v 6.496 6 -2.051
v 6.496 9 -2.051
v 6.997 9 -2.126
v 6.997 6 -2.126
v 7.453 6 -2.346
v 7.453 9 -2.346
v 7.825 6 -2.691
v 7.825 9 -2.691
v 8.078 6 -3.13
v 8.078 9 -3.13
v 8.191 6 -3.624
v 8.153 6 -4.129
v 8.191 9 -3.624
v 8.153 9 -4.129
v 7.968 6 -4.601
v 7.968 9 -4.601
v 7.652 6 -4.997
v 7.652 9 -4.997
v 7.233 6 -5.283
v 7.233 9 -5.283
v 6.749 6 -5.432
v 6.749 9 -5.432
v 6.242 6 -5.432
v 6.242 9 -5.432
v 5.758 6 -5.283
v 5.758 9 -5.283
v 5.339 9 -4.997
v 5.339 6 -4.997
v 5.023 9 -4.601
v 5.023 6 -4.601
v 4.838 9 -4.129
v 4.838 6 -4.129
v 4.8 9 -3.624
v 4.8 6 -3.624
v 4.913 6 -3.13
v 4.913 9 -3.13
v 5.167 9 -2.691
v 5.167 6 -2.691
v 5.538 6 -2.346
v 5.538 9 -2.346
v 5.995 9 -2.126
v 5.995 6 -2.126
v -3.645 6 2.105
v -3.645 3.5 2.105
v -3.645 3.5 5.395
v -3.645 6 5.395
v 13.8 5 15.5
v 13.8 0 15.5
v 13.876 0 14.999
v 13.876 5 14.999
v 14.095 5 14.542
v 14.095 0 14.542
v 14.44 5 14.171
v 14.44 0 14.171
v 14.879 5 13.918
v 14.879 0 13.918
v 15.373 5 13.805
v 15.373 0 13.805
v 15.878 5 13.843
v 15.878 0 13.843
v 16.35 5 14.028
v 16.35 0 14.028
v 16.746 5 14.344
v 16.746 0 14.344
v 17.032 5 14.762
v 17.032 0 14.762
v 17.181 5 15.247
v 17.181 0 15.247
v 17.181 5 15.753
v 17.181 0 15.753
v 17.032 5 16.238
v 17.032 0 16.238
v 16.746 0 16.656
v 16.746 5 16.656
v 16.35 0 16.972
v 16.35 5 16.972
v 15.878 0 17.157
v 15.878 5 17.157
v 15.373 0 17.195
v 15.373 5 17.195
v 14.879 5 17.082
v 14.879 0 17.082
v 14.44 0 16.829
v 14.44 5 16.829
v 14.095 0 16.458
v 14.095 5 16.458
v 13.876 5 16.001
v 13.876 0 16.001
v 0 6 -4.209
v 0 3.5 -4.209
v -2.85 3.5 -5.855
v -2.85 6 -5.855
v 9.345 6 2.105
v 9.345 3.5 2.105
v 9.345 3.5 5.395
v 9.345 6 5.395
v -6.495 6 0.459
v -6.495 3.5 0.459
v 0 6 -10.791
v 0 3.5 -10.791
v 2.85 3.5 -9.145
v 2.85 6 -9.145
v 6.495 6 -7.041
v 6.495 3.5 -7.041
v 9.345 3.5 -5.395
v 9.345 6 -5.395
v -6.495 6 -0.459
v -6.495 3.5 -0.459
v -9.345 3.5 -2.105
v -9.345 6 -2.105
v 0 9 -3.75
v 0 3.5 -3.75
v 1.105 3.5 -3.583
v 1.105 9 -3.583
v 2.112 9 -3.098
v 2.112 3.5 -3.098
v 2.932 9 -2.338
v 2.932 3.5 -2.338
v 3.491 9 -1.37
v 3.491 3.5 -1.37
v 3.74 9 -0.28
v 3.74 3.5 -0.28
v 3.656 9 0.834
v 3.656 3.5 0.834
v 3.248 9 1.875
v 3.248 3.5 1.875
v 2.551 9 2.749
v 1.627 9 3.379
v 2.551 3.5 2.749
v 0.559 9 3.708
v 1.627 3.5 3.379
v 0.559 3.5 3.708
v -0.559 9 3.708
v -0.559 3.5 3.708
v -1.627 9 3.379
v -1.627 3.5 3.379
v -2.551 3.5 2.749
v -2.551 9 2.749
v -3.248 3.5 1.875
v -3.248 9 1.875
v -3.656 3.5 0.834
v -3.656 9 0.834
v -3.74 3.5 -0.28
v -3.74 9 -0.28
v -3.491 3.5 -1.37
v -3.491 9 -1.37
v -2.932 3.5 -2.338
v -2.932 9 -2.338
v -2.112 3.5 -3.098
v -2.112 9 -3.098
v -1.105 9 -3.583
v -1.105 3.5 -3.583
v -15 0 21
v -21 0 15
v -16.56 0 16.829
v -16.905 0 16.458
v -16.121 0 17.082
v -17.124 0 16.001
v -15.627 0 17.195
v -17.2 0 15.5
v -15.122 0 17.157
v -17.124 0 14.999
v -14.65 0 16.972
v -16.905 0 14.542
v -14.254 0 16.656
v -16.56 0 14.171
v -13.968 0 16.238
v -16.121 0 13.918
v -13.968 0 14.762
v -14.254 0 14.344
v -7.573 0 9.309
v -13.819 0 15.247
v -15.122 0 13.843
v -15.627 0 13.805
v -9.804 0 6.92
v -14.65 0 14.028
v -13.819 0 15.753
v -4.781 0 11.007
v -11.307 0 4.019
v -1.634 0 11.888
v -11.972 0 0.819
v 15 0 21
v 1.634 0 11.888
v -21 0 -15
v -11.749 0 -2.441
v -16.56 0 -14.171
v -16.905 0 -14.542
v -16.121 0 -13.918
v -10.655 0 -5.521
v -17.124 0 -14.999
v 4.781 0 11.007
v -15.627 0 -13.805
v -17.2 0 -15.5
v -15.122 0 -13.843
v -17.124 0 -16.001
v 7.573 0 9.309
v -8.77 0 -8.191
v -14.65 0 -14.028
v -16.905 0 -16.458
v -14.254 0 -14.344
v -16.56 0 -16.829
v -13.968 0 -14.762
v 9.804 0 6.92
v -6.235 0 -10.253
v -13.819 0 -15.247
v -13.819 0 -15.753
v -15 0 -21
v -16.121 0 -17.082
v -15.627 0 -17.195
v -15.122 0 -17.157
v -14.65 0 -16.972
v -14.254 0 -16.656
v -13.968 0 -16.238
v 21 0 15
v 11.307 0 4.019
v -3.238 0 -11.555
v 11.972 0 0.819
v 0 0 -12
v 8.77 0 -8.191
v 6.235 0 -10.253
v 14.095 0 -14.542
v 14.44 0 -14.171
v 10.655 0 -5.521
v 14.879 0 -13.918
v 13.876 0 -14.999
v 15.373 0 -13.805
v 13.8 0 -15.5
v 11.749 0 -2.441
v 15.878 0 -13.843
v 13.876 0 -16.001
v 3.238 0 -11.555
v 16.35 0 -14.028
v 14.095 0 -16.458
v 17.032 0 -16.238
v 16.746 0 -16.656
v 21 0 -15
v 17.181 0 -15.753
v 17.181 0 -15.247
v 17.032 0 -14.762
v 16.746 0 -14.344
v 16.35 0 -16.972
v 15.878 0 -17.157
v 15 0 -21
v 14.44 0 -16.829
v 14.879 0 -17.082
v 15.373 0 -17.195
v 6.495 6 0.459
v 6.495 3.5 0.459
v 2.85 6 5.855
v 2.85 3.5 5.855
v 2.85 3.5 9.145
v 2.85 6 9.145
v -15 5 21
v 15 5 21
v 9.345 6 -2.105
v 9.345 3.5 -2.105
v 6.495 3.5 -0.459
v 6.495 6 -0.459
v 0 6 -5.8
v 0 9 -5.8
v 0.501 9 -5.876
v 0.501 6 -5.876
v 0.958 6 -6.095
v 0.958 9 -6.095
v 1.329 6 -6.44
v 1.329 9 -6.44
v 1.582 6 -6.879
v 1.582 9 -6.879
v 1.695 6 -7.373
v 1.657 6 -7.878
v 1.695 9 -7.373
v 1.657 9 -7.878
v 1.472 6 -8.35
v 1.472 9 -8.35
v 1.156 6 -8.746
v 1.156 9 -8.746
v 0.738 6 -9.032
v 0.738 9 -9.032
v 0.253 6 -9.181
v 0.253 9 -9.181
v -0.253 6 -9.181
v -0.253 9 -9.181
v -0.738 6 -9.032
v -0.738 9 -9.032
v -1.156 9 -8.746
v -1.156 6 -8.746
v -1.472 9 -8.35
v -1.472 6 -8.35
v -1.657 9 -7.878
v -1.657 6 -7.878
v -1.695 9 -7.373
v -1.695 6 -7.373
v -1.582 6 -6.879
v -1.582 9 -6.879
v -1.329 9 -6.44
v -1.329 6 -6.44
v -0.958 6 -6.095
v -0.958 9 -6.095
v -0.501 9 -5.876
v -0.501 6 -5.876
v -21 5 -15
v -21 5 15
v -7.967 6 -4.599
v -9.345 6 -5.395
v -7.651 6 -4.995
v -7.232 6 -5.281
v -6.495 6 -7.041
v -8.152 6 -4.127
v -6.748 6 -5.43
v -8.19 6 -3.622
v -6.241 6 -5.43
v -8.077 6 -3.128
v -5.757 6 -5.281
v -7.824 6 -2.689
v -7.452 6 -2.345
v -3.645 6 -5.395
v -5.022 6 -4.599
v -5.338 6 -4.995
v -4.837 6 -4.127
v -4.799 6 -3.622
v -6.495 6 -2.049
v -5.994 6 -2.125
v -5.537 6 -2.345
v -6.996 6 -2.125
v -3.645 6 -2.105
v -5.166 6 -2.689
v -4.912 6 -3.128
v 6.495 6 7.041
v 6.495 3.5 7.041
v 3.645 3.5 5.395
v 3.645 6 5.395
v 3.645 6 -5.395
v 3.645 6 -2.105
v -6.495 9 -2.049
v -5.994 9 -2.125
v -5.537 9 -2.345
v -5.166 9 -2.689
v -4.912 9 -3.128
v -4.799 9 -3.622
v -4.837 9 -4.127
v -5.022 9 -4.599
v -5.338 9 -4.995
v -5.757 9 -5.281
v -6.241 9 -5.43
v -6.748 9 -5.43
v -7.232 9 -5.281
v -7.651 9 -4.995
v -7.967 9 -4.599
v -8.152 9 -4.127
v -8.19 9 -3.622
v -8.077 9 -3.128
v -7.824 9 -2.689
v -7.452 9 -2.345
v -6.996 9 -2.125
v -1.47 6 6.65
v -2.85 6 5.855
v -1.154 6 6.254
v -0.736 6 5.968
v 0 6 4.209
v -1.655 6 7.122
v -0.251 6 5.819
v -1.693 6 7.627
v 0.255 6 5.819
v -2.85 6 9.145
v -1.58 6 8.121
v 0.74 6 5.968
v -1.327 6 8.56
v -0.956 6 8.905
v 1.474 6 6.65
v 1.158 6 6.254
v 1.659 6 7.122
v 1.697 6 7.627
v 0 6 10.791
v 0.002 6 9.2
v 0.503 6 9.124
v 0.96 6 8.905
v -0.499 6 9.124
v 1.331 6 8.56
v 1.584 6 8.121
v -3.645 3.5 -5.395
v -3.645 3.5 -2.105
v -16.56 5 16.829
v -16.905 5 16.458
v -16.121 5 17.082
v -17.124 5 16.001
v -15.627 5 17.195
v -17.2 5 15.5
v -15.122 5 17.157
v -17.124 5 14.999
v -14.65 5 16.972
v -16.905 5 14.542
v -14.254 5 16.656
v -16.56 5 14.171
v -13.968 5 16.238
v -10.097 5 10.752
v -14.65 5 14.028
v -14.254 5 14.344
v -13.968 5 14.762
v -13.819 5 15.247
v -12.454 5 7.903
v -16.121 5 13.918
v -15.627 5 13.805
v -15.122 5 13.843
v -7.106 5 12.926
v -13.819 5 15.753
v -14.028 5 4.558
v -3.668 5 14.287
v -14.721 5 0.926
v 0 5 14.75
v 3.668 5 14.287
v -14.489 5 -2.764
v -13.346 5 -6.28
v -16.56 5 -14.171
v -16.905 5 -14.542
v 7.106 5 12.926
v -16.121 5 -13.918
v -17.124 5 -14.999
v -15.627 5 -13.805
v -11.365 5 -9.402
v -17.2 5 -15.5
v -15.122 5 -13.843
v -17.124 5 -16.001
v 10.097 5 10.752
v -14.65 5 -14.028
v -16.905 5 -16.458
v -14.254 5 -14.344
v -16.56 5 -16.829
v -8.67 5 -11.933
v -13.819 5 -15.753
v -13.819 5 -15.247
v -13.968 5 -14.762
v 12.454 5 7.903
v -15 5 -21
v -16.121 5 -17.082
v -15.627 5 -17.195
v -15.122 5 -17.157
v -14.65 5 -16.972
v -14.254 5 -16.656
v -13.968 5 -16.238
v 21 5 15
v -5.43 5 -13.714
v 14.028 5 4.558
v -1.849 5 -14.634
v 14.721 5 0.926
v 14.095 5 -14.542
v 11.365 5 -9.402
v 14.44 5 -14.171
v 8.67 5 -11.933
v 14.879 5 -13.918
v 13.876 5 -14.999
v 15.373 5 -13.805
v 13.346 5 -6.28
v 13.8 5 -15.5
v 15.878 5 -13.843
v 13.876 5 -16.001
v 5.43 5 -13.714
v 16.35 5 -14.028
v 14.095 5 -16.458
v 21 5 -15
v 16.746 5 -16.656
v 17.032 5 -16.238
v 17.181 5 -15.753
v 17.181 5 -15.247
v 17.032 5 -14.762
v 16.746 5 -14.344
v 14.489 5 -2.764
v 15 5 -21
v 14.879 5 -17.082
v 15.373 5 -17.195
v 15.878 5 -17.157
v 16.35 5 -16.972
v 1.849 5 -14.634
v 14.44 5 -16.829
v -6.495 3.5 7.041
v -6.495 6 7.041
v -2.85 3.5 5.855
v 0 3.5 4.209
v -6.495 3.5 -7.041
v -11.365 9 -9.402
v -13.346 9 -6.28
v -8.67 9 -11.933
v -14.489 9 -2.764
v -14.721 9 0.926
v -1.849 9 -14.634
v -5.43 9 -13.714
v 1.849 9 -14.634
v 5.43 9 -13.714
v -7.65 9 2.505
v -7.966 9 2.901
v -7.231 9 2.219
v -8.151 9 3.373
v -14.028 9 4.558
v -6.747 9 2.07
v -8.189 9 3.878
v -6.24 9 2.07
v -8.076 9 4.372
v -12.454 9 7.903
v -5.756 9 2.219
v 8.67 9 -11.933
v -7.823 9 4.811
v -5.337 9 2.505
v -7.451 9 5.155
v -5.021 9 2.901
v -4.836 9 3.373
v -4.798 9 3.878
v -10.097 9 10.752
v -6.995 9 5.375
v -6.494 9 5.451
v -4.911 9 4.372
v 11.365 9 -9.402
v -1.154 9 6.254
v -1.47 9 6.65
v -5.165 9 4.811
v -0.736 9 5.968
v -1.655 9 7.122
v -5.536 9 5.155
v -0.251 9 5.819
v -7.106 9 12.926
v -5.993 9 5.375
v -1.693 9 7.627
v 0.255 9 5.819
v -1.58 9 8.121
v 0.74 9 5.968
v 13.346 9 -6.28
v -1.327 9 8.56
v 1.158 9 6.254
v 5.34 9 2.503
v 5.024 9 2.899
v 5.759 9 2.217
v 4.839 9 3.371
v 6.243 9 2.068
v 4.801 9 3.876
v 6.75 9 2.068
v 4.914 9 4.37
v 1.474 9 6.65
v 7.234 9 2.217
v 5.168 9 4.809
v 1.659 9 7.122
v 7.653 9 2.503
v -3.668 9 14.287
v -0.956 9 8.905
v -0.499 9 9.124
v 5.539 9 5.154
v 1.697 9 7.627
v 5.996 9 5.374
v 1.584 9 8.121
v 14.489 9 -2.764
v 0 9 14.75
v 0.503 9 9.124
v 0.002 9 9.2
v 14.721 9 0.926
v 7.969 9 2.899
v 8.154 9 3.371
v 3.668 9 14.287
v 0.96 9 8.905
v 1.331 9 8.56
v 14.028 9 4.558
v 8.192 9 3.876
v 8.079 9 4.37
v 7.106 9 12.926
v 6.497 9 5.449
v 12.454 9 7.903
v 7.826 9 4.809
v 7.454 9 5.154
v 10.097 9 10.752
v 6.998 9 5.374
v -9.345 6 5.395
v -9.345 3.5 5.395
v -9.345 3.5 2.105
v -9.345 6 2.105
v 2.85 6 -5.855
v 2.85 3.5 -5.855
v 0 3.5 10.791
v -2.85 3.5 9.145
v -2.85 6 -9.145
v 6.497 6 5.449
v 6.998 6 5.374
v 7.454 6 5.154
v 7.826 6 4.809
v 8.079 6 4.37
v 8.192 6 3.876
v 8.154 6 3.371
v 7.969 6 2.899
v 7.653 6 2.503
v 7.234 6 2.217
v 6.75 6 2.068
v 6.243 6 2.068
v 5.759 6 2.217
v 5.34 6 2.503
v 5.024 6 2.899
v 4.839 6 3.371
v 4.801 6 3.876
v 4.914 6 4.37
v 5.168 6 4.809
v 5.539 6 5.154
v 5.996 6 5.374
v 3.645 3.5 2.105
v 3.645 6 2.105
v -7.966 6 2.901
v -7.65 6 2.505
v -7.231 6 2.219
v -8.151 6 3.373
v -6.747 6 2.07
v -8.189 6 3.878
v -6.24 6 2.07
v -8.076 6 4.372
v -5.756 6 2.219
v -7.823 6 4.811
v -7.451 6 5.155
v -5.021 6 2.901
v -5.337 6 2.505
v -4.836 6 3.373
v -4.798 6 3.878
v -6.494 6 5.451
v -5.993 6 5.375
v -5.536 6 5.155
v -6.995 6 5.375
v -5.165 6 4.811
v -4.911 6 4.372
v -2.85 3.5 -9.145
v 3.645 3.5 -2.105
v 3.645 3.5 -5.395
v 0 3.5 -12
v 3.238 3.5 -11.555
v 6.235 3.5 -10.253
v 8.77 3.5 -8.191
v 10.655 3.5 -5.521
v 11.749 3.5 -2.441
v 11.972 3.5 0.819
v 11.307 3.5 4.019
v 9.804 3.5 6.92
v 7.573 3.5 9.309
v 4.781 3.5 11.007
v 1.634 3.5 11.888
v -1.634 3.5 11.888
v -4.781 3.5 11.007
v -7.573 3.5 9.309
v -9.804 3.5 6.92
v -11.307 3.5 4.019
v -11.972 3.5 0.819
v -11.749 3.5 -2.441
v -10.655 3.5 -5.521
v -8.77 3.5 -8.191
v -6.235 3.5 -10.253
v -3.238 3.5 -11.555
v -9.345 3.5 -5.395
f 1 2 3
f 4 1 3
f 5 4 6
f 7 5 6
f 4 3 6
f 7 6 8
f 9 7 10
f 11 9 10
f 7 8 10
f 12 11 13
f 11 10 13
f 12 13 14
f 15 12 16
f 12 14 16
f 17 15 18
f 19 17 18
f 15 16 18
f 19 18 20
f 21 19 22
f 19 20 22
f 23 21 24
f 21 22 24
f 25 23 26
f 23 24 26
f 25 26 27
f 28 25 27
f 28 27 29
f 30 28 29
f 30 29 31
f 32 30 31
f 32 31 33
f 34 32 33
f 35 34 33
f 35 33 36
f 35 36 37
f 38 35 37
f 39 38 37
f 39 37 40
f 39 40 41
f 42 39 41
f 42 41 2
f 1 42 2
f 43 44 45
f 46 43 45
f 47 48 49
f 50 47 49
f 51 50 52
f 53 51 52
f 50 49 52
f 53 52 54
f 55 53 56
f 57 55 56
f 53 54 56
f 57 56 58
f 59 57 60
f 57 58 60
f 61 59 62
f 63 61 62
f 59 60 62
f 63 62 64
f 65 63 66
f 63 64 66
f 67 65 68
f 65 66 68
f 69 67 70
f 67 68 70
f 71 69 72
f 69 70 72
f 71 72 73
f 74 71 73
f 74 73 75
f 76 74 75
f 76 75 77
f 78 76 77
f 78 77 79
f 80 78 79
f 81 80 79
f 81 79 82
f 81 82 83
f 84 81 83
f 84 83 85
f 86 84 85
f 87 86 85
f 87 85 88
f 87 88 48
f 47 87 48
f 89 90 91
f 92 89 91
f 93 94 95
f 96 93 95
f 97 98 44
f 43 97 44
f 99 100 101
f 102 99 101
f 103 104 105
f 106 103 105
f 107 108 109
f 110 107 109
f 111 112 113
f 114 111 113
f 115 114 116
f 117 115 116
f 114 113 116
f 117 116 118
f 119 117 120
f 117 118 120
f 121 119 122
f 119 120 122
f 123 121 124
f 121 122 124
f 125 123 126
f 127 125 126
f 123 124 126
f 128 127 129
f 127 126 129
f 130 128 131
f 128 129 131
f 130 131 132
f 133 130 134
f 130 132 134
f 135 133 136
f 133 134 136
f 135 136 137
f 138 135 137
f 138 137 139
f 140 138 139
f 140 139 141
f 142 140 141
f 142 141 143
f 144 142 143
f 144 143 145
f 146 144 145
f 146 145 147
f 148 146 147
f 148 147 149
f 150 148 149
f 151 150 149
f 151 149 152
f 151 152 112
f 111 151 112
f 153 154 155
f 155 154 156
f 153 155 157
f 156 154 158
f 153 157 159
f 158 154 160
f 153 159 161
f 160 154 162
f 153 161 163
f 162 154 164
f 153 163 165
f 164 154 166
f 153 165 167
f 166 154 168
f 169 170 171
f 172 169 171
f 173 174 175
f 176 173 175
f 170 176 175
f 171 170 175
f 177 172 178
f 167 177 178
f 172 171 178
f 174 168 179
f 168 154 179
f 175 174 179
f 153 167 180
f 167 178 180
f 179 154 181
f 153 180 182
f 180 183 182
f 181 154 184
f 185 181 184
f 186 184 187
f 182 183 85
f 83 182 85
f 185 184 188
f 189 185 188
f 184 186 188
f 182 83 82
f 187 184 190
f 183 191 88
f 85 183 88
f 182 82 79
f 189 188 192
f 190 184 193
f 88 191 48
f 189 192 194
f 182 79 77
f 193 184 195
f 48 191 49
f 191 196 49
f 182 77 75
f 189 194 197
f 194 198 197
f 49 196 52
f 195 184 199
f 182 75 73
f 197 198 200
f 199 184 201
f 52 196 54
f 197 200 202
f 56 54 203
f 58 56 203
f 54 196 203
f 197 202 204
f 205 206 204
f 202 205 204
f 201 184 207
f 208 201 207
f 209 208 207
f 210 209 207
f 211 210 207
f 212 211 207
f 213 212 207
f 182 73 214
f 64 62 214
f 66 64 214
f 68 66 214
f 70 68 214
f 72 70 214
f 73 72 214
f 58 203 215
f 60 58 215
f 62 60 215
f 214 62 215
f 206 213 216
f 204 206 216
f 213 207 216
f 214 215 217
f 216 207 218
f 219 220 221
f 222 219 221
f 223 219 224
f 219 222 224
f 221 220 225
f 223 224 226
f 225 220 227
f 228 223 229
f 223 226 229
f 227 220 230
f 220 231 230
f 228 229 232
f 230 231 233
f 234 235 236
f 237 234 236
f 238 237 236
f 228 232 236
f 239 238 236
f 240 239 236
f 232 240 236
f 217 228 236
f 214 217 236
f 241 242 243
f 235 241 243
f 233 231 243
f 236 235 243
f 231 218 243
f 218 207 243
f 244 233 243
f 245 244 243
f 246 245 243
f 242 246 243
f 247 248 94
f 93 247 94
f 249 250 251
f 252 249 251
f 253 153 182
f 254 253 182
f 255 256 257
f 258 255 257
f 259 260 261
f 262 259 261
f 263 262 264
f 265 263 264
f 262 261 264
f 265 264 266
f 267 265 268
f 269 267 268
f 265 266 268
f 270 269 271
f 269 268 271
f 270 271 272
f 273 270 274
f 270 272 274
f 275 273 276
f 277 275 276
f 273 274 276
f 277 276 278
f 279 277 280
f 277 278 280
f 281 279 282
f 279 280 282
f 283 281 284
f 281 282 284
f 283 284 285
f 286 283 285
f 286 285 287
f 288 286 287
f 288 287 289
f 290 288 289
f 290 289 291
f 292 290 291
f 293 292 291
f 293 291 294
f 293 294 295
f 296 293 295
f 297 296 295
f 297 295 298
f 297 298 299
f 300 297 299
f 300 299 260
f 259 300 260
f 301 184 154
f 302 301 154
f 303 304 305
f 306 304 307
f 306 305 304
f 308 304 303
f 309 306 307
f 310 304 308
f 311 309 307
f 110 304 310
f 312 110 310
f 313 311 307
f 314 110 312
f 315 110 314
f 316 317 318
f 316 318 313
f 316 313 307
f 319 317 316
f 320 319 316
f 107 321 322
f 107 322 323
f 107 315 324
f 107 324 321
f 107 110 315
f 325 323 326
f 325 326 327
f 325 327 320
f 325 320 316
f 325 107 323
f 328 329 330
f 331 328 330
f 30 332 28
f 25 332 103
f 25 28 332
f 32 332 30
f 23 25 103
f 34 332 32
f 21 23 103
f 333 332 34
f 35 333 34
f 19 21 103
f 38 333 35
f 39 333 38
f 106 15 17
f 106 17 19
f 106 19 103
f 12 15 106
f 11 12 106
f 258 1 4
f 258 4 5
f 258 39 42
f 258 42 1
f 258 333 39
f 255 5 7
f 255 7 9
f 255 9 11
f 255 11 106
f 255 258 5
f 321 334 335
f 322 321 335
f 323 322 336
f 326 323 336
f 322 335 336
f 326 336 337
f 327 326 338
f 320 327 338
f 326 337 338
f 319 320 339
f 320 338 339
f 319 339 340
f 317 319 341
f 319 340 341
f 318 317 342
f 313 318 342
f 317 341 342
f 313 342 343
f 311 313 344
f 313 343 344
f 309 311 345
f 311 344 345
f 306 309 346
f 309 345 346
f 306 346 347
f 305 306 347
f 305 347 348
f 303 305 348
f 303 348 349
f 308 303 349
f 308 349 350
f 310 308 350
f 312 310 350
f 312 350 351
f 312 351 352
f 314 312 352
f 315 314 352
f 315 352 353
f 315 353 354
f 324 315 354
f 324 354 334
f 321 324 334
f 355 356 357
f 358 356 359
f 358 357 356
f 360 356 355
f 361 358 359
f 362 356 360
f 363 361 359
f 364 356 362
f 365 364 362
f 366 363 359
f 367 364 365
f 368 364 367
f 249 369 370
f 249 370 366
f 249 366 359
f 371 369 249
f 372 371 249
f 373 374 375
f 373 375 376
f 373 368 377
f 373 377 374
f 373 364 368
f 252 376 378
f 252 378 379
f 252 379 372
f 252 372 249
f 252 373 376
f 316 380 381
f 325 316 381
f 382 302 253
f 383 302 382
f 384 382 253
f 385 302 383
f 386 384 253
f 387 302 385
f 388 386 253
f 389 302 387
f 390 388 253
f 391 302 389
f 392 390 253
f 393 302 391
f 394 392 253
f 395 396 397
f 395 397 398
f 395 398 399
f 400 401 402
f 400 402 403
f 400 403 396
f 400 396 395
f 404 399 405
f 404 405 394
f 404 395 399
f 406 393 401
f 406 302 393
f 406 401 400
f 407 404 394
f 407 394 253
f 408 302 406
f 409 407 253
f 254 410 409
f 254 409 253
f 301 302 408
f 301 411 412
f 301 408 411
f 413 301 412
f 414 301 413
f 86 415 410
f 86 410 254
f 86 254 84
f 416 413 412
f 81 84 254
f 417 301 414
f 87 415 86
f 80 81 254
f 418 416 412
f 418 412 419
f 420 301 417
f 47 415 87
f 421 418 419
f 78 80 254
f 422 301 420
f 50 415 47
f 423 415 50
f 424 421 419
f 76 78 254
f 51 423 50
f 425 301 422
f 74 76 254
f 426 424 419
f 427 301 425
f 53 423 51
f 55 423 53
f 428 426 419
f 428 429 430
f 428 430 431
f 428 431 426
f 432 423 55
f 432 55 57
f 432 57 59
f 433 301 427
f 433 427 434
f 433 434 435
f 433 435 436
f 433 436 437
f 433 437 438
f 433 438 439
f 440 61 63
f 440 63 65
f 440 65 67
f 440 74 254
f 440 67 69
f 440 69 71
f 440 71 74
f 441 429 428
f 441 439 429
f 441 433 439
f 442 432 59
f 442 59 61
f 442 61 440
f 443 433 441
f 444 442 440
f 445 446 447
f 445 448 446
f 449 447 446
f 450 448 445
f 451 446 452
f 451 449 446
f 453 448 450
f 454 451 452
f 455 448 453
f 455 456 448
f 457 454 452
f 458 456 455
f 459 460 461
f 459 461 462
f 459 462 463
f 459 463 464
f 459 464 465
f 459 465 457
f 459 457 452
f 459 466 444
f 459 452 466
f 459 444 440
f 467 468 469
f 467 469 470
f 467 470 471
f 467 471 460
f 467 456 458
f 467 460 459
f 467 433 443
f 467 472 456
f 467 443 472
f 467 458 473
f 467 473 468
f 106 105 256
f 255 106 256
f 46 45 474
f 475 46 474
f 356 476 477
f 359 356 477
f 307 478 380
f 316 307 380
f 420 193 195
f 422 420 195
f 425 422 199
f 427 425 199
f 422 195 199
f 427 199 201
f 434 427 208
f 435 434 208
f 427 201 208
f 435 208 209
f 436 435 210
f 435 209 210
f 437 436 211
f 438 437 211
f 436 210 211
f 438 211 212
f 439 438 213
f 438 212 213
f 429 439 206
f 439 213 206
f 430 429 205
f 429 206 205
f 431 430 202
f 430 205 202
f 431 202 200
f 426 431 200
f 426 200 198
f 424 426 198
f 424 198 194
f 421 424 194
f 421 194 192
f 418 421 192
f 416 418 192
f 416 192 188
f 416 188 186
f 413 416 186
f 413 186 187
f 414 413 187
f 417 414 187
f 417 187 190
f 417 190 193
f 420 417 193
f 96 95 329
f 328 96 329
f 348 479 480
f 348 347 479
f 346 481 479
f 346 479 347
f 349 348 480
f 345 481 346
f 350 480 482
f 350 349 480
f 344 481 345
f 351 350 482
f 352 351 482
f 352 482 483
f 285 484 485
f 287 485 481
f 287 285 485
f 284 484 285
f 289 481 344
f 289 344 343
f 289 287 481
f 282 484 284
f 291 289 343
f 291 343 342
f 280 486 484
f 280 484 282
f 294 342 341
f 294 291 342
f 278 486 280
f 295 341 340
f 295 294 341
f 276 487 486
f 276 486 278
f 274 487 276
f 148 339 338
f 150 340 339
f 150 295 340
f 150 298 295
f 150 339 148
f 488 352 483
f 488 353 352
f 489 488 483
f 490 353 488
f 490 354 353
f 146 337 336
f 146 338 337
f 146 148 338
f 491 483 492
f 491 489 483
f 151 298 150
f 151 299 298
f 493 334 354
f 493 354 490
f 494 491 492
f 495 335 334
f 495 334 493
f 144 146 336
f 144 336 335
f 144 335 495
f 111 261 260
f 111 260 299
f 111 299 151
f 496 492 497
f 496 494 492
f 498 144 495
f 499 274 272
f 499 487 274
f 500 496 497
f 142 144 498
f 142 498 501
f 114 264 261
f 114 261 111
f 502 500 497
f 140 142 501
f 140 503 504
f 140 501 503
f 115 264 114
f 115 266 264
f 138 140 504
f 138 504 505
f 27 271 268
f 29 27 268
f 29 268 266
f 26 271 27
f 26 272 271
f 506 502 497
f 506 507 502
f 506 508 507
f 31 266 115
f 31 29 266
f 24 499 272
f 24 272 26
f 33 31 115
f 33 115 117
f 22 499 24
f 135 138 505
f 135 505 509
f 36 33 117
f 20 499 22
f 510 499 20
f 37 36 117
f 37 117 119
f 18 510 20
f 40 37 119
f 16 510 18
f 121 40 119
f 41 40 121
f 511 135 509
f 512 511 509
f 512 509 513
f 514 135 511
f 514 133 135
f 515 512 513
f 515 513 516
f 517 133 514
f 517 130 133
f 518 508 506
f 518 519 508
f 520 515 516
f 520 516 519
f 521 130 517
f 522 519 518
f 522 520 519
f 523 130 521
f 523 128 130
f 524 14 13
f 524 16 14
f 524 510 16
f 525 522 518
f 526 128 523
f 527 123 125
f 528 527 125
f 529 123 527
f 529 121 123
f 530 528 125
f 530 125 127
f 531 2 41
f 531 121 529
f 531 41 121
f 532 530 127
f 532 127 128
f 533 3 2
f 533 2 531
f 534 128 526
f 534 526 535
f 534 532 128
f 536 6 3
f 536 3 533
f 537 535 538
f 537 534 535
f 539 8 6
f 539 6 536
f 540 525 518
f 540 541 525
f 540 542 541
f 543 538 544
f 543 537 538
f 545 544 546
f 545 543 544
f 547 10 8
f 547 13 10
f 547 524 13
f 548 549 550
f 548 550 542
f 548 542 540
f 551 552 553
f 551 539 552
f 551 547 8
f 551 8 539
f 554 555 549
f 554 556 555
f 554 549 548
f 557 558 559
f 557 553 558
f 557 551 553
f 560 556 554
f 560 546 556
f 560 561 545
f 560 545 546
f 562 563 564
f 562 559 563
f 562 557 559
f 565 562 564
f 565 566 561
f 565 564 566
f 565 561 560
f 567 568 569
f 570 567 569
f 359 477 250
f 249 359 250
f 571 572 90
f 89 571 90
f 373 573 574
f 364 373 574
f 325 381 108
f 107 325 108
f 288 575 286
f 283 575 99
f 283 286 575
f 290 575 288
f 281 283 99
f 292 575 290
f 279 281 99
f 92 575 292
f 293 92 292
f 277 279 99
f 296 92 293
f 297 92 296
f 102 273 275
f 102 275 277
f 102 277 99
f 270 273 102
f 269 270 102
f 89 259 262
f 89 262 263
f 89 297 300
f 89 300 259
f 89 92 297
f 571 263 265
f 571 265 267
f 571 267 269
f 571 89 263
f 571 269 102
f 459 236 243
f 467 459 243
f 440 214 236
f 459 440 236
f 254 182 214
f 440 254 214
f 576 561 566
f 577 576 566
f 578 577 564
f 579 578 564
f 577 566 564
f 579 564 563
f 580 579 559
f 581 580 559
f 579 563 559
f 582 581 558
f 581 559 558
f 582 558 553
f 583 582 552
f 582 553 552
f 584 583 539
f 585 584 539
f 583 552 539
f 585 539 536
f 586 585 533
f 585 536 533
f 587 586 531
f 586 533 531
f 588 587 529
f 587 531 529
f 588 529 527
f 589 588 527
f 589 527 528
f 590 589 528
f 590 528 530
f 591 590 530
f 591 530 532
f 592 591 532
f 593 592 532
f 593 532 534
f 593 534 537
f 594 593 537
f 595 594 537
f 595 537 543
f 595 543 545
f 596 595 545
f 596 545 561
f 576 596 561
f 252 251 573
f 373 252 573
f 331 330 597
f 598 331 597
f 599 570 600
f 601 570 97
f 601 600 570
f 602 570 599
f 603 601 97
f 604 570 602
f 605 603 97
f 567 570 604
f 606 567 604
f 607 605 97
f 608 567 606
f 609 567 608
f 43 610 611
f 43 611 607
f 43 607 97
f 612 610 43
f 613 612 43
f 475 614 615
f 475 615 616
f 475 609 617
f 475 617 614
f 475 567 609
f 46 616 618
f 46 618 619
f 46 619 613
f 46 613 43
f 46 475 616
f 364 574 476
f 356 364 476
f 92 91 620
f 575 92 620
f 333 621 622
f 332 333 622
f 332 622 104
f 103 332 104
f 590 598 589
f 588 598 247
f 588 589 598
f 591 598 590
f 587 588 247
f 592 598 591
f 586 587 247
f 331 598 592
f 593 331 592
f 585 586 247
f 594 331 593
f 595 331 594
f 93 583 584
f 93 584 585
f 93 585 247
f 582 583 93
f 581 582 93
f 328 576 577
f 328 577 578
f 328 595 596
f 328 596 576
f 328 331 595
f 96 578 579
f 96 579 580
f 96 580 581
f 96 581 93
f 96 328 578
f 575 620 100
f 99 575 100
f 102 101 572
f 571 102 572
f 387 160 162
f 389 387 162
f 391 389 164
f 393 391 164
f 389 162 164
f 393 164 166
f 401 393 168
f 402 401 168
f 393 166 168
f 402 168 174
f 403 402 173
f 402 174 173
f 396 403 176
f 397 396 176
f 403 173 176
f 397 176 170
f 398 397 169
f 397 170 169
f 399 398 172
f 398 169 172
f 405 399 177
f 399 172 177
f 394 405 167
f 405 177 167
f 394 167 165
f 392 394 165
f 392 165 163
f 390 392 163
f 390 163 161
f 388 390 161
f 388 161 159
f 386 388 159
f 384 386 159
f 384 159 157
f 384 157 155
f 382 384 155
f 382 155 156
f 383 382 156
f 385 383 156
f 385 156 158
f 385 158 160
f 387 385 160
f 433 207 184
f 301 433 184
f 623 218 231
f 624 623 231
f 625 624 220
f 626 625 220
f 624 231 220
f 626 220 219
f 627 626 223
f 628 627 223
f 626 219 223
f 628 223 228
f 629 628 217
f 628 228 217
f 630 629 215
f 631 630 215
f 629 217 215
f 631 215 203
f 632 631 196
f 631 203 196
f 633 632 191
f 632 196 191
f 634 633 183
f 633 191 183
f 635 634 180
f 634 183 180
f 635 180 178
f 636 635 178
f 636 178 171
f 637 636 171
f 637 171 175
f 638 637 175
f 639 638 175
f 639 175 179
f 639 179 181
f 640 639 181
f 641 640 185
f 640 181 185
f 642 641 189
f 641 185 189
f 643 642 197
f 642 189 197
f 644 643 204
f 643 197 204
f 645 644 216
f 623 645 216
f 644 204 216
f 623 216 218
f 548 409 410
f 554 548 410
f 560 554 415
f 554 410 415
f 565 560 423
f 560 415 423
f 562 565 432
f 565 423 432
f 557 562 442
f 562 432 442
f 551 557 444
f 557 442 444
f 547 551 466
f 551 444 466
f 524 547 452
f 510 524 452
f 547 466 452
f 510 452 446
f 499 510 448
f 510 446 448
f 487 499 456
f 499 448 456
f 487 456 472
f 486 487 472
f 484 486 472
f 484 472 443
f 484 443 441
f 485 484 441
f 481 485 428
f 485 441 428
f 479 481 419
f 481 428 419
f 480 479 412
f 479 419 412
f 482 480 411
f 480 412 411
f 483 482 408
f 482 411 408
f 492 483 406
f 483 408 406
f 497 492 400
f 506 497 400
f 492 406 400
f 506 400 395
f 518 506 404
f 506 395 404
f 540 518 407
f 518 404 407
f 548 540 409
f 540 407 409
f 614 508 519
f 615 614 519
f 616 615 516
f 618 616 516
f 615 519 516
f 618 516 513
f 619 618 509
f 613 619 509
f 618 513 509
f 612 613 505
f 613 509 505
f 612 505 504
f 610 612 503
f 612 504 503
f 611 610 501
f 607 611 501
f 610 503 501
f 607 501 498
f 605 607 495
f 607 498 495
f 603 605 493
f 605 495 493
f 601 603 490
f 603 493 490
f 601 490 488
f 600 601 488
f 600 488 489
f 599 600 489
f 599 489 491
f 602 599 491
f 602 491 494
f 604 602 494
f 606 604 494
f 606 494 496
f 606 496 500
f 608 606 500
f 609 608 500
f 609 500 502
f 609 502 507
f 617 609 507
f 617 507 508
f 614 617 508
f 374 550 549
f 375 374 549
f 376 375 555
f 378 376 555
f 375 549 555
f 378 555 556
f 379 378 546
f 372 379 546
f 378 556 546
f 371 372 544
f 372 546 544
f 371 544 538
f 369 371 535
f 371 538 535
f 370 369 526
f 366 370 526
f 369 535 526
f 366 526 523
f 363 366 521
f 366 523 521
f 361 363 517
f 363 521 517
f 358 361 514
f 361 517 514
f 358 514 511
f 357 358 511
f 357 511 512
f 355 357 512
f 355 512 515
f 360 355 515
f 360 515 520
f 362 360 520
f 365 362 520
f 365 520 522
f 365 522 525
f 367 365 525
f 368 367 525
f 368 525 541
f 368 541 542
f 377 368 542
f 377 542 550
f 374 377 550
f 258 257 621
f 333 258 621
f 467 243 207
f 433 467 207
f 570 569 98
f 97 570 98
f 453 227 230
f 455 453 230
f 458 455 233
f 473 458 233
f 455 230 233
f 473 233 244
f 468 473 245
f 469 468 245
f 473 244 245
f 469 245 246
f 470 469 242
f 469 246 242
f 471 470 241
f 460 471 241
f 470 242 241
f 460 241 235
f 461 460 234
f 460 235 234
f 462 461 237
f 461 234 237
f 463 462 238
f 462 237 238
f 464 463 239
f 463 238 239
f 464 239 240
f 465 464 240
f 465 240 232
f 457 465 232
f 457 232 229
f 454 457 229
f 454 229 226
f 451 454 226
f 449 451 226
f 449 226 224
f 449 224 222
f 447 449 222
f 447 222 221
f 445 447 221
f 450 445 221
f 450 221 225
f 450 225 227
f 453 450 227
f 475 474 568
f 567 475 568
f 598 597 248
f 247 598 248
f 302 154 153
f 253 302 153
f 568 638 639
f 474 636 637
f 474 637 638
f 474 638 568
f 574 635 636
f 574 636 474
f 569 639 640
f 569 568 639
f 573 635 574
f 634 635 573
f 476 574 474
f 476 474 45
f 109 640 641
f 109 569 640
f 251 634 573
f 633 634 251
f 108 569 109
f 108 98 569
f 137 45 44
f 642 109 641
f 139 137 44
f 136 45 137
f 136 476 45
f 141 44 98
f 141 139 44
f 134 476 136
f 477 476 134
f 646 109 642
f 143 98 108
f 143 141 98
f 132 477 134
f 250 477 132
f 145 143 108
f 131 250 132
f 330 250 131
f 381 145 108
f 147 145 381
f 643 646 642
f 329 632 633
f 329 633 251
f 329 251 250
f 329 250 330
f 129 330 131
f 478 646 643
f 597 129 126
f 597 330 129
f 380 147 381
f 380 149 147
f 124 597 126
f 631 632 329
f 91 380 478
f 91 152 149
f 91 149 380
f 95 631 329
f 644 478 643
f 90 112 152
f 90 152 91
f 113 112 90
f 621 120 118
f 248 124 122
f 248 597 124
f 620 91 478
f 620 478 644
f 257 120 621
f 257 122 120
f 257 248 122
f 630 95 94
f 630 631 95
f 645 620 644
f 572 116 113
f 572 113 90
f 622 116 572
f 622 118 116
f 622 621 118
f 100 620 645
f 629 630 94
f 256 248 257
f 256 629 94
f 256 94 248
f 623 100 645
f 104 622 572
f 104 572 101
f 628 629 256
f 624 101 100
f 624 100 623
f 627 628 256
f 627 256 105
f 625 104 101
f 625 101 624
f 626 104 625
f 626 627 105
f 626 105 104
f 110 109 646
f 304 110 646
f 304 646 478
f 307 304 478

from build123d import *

# Parameters (mm, degrees)
BOSS_EXTRUDE1_DEPTH  = 5
M3_CLEARANCE_HOLE1_D = 3.4
SKETCH2_R            = 14.75
BOSS_EXTRUDE2_DEPTH  = 4
SKETCH4_R            = 12
CUT_EXTRUDE1_DEPTH   = 3.5
CUT_EXTRUDE2_DEPTH   = 2.5
SKETCH8_R            = 3.75
CUT_EXTRUDE3_DEPTH   = 31.203476621
SKETCH3_R            = 1.7
CUT_EXTRUDE4_DEPTH   = 32.032241298


with BuildPart() as part:
    # Sketch1 → Boss-Extrude1 (new body)
    with BuildSketch(Plane(origin=(0, 0, 0), x_dir=(1, 0, 0), z_dir=(0, 1, 0))):
        Polygon((-21, 15), (-21, -15), (-15, -21), (15, -21), (21, -15), (21, 15), (15, 21), (-15, 21), align=None)
    extrude(amount=BOSS_EXTRUDE1_DEPTH)

    # M3 Clearance Hole1 (through all)
    with Locations(Plane(origin=(0, 5, 0), x_dir=(1, 0, 0), z_dir=(0, 1, 0))):
        with Locations((15.5, 15.5), (-15.5, 15.5), (-15.5, -15.5), (15.5, -15.5)):
            Hole(M3_CLEARANCE_HOLE1_D / 2)

    # Sketch2 → Boss-Extrude2 (add)
    with BuildSketch(Plane(origin=(0, 5, 0), x_dir=(1, 0, 0), z_dir=(0, 1, 0))):
        with Locations(Location((0, 0, 0), (0, 0, 270))):
            Circle(SKETCH2_R)
    extrude(amount=BOSS_EXTRUDE2_DEPTH)

    # Sketch4 → Cut-Extrude1 (cut)
    with BuildSketch(Plane(origin=(0, 0, 0), x_dir=(-1, 0, 0), z_dir=(0, -1, 0))):
        with Locations(Location((0, 0, 0), (0, 0, 90))):
            Circle(SKETCH4_R)
    extrude(amount=-CUT_EXTRUDE1_DEPTH, mode=Mode.SUBTRACT)

    # Sketch7 → Cut-Extrude2 (cut)
    with BuildSketch(Plane.XZ.offset(-3.5)):
        Polygon((3.645190528, 2.104551733), (6.495190528, 0.459103466), (9.345190528, 2.104551733), (9.345190528, 5.395448267), (6.495190528, 7.040896534), (3.645190528, 5.395448267), align=None)
        Polygon((0, 4.209103466), (2.85, 5.854551733), (2.85, 9.145448267), (0, 10.790896534), (-2.85, 9.145448267), (-2.85, 5.854551733), align=None)
        Polygon((3.645190528, -2.104551733), (3.645190528, -5.395448267), (6.495190528, -7.040896534), (9.345190528, -5.395448267), (9.345190528, -2.104551733), (6.495190528, -0.459103466), align=None)
        Polygon((0, -4.209103466), (-2.85, -5.854551733), (-2.85, -9.145448267), (0, -10.790896534), (2.85, -9.145448267), (2.85, -5.854551733), align=None)
        Polygon((-3.645190528, -2.104551733), (-6.495190528, -0.459103466), (-9.345190528, -2.104551733), (-9.345190528, -5.395448267), (-6.495190528, -7.040896534), (-3.645190528, -5.395448267), align=None)
        Polygon((-3.645190528, 2.104551733), (-3.645190528, 5.395448267), (-6.495190528, 7.040896534), (-9.345190528, 5.395448267), (-9.345190528, 2.104551733), (-6.495190528, 0.459103466), align=None)
    extrude(amount=-CUT_EXTRUDE2_DEPTH, mode=Mode.SUBTRACT)

    # Sketch8 → Cut-Extrude3 (cut, through all)
    with BuildSketch(Plane.XZ.offset(-3.5)):
        with Locations(Location((0, 0, 0), (0, 0, 270))):
            Circle(SKETCH8_R)
    extrude(amount=-CUT_EXTRUDE3_DEPTH, mode=Mode.SUBTRACT)

    # Sketch3 → Cut-Extrude4 (cut, through all)
    with BuildSketch(Plane(origin=(0, 9, 0), x_dir=(1, 0, 0), z_dir=(0, 1, 0))):
        with Locations(Location((0, 7.5, 0), (0, 0, 270))):
            Circle(SKETCH3_R)
        with Locations(Location((6.495690528, 3.750866025, 0), (0, 0, 270))):
            Circle(SKETCH3_R)
        with Locations(Location((6.496690528, -3.749133975, 0), (0, 0, 270))):
            Circle(SKETCH3_R)
        with Locations(Location((0.002, -7.5, 0), (0, 0, 270))):
            Circle(SKETCH3_R)
        with Locations(Location((-6.493690528, -3.750866025, 0), (0, 0, 270))):
            Circle(SKETCH3_R)
        with Locations(Location((-6.494690528, 3.749133975, 0), (0, 0, 270))):
            Circle(SKETCH3_R)
    extrude(amount=-CUT_EXTRUDE4_DEPTH, mode=Mode.SUBTRACT)


solid = part.part
